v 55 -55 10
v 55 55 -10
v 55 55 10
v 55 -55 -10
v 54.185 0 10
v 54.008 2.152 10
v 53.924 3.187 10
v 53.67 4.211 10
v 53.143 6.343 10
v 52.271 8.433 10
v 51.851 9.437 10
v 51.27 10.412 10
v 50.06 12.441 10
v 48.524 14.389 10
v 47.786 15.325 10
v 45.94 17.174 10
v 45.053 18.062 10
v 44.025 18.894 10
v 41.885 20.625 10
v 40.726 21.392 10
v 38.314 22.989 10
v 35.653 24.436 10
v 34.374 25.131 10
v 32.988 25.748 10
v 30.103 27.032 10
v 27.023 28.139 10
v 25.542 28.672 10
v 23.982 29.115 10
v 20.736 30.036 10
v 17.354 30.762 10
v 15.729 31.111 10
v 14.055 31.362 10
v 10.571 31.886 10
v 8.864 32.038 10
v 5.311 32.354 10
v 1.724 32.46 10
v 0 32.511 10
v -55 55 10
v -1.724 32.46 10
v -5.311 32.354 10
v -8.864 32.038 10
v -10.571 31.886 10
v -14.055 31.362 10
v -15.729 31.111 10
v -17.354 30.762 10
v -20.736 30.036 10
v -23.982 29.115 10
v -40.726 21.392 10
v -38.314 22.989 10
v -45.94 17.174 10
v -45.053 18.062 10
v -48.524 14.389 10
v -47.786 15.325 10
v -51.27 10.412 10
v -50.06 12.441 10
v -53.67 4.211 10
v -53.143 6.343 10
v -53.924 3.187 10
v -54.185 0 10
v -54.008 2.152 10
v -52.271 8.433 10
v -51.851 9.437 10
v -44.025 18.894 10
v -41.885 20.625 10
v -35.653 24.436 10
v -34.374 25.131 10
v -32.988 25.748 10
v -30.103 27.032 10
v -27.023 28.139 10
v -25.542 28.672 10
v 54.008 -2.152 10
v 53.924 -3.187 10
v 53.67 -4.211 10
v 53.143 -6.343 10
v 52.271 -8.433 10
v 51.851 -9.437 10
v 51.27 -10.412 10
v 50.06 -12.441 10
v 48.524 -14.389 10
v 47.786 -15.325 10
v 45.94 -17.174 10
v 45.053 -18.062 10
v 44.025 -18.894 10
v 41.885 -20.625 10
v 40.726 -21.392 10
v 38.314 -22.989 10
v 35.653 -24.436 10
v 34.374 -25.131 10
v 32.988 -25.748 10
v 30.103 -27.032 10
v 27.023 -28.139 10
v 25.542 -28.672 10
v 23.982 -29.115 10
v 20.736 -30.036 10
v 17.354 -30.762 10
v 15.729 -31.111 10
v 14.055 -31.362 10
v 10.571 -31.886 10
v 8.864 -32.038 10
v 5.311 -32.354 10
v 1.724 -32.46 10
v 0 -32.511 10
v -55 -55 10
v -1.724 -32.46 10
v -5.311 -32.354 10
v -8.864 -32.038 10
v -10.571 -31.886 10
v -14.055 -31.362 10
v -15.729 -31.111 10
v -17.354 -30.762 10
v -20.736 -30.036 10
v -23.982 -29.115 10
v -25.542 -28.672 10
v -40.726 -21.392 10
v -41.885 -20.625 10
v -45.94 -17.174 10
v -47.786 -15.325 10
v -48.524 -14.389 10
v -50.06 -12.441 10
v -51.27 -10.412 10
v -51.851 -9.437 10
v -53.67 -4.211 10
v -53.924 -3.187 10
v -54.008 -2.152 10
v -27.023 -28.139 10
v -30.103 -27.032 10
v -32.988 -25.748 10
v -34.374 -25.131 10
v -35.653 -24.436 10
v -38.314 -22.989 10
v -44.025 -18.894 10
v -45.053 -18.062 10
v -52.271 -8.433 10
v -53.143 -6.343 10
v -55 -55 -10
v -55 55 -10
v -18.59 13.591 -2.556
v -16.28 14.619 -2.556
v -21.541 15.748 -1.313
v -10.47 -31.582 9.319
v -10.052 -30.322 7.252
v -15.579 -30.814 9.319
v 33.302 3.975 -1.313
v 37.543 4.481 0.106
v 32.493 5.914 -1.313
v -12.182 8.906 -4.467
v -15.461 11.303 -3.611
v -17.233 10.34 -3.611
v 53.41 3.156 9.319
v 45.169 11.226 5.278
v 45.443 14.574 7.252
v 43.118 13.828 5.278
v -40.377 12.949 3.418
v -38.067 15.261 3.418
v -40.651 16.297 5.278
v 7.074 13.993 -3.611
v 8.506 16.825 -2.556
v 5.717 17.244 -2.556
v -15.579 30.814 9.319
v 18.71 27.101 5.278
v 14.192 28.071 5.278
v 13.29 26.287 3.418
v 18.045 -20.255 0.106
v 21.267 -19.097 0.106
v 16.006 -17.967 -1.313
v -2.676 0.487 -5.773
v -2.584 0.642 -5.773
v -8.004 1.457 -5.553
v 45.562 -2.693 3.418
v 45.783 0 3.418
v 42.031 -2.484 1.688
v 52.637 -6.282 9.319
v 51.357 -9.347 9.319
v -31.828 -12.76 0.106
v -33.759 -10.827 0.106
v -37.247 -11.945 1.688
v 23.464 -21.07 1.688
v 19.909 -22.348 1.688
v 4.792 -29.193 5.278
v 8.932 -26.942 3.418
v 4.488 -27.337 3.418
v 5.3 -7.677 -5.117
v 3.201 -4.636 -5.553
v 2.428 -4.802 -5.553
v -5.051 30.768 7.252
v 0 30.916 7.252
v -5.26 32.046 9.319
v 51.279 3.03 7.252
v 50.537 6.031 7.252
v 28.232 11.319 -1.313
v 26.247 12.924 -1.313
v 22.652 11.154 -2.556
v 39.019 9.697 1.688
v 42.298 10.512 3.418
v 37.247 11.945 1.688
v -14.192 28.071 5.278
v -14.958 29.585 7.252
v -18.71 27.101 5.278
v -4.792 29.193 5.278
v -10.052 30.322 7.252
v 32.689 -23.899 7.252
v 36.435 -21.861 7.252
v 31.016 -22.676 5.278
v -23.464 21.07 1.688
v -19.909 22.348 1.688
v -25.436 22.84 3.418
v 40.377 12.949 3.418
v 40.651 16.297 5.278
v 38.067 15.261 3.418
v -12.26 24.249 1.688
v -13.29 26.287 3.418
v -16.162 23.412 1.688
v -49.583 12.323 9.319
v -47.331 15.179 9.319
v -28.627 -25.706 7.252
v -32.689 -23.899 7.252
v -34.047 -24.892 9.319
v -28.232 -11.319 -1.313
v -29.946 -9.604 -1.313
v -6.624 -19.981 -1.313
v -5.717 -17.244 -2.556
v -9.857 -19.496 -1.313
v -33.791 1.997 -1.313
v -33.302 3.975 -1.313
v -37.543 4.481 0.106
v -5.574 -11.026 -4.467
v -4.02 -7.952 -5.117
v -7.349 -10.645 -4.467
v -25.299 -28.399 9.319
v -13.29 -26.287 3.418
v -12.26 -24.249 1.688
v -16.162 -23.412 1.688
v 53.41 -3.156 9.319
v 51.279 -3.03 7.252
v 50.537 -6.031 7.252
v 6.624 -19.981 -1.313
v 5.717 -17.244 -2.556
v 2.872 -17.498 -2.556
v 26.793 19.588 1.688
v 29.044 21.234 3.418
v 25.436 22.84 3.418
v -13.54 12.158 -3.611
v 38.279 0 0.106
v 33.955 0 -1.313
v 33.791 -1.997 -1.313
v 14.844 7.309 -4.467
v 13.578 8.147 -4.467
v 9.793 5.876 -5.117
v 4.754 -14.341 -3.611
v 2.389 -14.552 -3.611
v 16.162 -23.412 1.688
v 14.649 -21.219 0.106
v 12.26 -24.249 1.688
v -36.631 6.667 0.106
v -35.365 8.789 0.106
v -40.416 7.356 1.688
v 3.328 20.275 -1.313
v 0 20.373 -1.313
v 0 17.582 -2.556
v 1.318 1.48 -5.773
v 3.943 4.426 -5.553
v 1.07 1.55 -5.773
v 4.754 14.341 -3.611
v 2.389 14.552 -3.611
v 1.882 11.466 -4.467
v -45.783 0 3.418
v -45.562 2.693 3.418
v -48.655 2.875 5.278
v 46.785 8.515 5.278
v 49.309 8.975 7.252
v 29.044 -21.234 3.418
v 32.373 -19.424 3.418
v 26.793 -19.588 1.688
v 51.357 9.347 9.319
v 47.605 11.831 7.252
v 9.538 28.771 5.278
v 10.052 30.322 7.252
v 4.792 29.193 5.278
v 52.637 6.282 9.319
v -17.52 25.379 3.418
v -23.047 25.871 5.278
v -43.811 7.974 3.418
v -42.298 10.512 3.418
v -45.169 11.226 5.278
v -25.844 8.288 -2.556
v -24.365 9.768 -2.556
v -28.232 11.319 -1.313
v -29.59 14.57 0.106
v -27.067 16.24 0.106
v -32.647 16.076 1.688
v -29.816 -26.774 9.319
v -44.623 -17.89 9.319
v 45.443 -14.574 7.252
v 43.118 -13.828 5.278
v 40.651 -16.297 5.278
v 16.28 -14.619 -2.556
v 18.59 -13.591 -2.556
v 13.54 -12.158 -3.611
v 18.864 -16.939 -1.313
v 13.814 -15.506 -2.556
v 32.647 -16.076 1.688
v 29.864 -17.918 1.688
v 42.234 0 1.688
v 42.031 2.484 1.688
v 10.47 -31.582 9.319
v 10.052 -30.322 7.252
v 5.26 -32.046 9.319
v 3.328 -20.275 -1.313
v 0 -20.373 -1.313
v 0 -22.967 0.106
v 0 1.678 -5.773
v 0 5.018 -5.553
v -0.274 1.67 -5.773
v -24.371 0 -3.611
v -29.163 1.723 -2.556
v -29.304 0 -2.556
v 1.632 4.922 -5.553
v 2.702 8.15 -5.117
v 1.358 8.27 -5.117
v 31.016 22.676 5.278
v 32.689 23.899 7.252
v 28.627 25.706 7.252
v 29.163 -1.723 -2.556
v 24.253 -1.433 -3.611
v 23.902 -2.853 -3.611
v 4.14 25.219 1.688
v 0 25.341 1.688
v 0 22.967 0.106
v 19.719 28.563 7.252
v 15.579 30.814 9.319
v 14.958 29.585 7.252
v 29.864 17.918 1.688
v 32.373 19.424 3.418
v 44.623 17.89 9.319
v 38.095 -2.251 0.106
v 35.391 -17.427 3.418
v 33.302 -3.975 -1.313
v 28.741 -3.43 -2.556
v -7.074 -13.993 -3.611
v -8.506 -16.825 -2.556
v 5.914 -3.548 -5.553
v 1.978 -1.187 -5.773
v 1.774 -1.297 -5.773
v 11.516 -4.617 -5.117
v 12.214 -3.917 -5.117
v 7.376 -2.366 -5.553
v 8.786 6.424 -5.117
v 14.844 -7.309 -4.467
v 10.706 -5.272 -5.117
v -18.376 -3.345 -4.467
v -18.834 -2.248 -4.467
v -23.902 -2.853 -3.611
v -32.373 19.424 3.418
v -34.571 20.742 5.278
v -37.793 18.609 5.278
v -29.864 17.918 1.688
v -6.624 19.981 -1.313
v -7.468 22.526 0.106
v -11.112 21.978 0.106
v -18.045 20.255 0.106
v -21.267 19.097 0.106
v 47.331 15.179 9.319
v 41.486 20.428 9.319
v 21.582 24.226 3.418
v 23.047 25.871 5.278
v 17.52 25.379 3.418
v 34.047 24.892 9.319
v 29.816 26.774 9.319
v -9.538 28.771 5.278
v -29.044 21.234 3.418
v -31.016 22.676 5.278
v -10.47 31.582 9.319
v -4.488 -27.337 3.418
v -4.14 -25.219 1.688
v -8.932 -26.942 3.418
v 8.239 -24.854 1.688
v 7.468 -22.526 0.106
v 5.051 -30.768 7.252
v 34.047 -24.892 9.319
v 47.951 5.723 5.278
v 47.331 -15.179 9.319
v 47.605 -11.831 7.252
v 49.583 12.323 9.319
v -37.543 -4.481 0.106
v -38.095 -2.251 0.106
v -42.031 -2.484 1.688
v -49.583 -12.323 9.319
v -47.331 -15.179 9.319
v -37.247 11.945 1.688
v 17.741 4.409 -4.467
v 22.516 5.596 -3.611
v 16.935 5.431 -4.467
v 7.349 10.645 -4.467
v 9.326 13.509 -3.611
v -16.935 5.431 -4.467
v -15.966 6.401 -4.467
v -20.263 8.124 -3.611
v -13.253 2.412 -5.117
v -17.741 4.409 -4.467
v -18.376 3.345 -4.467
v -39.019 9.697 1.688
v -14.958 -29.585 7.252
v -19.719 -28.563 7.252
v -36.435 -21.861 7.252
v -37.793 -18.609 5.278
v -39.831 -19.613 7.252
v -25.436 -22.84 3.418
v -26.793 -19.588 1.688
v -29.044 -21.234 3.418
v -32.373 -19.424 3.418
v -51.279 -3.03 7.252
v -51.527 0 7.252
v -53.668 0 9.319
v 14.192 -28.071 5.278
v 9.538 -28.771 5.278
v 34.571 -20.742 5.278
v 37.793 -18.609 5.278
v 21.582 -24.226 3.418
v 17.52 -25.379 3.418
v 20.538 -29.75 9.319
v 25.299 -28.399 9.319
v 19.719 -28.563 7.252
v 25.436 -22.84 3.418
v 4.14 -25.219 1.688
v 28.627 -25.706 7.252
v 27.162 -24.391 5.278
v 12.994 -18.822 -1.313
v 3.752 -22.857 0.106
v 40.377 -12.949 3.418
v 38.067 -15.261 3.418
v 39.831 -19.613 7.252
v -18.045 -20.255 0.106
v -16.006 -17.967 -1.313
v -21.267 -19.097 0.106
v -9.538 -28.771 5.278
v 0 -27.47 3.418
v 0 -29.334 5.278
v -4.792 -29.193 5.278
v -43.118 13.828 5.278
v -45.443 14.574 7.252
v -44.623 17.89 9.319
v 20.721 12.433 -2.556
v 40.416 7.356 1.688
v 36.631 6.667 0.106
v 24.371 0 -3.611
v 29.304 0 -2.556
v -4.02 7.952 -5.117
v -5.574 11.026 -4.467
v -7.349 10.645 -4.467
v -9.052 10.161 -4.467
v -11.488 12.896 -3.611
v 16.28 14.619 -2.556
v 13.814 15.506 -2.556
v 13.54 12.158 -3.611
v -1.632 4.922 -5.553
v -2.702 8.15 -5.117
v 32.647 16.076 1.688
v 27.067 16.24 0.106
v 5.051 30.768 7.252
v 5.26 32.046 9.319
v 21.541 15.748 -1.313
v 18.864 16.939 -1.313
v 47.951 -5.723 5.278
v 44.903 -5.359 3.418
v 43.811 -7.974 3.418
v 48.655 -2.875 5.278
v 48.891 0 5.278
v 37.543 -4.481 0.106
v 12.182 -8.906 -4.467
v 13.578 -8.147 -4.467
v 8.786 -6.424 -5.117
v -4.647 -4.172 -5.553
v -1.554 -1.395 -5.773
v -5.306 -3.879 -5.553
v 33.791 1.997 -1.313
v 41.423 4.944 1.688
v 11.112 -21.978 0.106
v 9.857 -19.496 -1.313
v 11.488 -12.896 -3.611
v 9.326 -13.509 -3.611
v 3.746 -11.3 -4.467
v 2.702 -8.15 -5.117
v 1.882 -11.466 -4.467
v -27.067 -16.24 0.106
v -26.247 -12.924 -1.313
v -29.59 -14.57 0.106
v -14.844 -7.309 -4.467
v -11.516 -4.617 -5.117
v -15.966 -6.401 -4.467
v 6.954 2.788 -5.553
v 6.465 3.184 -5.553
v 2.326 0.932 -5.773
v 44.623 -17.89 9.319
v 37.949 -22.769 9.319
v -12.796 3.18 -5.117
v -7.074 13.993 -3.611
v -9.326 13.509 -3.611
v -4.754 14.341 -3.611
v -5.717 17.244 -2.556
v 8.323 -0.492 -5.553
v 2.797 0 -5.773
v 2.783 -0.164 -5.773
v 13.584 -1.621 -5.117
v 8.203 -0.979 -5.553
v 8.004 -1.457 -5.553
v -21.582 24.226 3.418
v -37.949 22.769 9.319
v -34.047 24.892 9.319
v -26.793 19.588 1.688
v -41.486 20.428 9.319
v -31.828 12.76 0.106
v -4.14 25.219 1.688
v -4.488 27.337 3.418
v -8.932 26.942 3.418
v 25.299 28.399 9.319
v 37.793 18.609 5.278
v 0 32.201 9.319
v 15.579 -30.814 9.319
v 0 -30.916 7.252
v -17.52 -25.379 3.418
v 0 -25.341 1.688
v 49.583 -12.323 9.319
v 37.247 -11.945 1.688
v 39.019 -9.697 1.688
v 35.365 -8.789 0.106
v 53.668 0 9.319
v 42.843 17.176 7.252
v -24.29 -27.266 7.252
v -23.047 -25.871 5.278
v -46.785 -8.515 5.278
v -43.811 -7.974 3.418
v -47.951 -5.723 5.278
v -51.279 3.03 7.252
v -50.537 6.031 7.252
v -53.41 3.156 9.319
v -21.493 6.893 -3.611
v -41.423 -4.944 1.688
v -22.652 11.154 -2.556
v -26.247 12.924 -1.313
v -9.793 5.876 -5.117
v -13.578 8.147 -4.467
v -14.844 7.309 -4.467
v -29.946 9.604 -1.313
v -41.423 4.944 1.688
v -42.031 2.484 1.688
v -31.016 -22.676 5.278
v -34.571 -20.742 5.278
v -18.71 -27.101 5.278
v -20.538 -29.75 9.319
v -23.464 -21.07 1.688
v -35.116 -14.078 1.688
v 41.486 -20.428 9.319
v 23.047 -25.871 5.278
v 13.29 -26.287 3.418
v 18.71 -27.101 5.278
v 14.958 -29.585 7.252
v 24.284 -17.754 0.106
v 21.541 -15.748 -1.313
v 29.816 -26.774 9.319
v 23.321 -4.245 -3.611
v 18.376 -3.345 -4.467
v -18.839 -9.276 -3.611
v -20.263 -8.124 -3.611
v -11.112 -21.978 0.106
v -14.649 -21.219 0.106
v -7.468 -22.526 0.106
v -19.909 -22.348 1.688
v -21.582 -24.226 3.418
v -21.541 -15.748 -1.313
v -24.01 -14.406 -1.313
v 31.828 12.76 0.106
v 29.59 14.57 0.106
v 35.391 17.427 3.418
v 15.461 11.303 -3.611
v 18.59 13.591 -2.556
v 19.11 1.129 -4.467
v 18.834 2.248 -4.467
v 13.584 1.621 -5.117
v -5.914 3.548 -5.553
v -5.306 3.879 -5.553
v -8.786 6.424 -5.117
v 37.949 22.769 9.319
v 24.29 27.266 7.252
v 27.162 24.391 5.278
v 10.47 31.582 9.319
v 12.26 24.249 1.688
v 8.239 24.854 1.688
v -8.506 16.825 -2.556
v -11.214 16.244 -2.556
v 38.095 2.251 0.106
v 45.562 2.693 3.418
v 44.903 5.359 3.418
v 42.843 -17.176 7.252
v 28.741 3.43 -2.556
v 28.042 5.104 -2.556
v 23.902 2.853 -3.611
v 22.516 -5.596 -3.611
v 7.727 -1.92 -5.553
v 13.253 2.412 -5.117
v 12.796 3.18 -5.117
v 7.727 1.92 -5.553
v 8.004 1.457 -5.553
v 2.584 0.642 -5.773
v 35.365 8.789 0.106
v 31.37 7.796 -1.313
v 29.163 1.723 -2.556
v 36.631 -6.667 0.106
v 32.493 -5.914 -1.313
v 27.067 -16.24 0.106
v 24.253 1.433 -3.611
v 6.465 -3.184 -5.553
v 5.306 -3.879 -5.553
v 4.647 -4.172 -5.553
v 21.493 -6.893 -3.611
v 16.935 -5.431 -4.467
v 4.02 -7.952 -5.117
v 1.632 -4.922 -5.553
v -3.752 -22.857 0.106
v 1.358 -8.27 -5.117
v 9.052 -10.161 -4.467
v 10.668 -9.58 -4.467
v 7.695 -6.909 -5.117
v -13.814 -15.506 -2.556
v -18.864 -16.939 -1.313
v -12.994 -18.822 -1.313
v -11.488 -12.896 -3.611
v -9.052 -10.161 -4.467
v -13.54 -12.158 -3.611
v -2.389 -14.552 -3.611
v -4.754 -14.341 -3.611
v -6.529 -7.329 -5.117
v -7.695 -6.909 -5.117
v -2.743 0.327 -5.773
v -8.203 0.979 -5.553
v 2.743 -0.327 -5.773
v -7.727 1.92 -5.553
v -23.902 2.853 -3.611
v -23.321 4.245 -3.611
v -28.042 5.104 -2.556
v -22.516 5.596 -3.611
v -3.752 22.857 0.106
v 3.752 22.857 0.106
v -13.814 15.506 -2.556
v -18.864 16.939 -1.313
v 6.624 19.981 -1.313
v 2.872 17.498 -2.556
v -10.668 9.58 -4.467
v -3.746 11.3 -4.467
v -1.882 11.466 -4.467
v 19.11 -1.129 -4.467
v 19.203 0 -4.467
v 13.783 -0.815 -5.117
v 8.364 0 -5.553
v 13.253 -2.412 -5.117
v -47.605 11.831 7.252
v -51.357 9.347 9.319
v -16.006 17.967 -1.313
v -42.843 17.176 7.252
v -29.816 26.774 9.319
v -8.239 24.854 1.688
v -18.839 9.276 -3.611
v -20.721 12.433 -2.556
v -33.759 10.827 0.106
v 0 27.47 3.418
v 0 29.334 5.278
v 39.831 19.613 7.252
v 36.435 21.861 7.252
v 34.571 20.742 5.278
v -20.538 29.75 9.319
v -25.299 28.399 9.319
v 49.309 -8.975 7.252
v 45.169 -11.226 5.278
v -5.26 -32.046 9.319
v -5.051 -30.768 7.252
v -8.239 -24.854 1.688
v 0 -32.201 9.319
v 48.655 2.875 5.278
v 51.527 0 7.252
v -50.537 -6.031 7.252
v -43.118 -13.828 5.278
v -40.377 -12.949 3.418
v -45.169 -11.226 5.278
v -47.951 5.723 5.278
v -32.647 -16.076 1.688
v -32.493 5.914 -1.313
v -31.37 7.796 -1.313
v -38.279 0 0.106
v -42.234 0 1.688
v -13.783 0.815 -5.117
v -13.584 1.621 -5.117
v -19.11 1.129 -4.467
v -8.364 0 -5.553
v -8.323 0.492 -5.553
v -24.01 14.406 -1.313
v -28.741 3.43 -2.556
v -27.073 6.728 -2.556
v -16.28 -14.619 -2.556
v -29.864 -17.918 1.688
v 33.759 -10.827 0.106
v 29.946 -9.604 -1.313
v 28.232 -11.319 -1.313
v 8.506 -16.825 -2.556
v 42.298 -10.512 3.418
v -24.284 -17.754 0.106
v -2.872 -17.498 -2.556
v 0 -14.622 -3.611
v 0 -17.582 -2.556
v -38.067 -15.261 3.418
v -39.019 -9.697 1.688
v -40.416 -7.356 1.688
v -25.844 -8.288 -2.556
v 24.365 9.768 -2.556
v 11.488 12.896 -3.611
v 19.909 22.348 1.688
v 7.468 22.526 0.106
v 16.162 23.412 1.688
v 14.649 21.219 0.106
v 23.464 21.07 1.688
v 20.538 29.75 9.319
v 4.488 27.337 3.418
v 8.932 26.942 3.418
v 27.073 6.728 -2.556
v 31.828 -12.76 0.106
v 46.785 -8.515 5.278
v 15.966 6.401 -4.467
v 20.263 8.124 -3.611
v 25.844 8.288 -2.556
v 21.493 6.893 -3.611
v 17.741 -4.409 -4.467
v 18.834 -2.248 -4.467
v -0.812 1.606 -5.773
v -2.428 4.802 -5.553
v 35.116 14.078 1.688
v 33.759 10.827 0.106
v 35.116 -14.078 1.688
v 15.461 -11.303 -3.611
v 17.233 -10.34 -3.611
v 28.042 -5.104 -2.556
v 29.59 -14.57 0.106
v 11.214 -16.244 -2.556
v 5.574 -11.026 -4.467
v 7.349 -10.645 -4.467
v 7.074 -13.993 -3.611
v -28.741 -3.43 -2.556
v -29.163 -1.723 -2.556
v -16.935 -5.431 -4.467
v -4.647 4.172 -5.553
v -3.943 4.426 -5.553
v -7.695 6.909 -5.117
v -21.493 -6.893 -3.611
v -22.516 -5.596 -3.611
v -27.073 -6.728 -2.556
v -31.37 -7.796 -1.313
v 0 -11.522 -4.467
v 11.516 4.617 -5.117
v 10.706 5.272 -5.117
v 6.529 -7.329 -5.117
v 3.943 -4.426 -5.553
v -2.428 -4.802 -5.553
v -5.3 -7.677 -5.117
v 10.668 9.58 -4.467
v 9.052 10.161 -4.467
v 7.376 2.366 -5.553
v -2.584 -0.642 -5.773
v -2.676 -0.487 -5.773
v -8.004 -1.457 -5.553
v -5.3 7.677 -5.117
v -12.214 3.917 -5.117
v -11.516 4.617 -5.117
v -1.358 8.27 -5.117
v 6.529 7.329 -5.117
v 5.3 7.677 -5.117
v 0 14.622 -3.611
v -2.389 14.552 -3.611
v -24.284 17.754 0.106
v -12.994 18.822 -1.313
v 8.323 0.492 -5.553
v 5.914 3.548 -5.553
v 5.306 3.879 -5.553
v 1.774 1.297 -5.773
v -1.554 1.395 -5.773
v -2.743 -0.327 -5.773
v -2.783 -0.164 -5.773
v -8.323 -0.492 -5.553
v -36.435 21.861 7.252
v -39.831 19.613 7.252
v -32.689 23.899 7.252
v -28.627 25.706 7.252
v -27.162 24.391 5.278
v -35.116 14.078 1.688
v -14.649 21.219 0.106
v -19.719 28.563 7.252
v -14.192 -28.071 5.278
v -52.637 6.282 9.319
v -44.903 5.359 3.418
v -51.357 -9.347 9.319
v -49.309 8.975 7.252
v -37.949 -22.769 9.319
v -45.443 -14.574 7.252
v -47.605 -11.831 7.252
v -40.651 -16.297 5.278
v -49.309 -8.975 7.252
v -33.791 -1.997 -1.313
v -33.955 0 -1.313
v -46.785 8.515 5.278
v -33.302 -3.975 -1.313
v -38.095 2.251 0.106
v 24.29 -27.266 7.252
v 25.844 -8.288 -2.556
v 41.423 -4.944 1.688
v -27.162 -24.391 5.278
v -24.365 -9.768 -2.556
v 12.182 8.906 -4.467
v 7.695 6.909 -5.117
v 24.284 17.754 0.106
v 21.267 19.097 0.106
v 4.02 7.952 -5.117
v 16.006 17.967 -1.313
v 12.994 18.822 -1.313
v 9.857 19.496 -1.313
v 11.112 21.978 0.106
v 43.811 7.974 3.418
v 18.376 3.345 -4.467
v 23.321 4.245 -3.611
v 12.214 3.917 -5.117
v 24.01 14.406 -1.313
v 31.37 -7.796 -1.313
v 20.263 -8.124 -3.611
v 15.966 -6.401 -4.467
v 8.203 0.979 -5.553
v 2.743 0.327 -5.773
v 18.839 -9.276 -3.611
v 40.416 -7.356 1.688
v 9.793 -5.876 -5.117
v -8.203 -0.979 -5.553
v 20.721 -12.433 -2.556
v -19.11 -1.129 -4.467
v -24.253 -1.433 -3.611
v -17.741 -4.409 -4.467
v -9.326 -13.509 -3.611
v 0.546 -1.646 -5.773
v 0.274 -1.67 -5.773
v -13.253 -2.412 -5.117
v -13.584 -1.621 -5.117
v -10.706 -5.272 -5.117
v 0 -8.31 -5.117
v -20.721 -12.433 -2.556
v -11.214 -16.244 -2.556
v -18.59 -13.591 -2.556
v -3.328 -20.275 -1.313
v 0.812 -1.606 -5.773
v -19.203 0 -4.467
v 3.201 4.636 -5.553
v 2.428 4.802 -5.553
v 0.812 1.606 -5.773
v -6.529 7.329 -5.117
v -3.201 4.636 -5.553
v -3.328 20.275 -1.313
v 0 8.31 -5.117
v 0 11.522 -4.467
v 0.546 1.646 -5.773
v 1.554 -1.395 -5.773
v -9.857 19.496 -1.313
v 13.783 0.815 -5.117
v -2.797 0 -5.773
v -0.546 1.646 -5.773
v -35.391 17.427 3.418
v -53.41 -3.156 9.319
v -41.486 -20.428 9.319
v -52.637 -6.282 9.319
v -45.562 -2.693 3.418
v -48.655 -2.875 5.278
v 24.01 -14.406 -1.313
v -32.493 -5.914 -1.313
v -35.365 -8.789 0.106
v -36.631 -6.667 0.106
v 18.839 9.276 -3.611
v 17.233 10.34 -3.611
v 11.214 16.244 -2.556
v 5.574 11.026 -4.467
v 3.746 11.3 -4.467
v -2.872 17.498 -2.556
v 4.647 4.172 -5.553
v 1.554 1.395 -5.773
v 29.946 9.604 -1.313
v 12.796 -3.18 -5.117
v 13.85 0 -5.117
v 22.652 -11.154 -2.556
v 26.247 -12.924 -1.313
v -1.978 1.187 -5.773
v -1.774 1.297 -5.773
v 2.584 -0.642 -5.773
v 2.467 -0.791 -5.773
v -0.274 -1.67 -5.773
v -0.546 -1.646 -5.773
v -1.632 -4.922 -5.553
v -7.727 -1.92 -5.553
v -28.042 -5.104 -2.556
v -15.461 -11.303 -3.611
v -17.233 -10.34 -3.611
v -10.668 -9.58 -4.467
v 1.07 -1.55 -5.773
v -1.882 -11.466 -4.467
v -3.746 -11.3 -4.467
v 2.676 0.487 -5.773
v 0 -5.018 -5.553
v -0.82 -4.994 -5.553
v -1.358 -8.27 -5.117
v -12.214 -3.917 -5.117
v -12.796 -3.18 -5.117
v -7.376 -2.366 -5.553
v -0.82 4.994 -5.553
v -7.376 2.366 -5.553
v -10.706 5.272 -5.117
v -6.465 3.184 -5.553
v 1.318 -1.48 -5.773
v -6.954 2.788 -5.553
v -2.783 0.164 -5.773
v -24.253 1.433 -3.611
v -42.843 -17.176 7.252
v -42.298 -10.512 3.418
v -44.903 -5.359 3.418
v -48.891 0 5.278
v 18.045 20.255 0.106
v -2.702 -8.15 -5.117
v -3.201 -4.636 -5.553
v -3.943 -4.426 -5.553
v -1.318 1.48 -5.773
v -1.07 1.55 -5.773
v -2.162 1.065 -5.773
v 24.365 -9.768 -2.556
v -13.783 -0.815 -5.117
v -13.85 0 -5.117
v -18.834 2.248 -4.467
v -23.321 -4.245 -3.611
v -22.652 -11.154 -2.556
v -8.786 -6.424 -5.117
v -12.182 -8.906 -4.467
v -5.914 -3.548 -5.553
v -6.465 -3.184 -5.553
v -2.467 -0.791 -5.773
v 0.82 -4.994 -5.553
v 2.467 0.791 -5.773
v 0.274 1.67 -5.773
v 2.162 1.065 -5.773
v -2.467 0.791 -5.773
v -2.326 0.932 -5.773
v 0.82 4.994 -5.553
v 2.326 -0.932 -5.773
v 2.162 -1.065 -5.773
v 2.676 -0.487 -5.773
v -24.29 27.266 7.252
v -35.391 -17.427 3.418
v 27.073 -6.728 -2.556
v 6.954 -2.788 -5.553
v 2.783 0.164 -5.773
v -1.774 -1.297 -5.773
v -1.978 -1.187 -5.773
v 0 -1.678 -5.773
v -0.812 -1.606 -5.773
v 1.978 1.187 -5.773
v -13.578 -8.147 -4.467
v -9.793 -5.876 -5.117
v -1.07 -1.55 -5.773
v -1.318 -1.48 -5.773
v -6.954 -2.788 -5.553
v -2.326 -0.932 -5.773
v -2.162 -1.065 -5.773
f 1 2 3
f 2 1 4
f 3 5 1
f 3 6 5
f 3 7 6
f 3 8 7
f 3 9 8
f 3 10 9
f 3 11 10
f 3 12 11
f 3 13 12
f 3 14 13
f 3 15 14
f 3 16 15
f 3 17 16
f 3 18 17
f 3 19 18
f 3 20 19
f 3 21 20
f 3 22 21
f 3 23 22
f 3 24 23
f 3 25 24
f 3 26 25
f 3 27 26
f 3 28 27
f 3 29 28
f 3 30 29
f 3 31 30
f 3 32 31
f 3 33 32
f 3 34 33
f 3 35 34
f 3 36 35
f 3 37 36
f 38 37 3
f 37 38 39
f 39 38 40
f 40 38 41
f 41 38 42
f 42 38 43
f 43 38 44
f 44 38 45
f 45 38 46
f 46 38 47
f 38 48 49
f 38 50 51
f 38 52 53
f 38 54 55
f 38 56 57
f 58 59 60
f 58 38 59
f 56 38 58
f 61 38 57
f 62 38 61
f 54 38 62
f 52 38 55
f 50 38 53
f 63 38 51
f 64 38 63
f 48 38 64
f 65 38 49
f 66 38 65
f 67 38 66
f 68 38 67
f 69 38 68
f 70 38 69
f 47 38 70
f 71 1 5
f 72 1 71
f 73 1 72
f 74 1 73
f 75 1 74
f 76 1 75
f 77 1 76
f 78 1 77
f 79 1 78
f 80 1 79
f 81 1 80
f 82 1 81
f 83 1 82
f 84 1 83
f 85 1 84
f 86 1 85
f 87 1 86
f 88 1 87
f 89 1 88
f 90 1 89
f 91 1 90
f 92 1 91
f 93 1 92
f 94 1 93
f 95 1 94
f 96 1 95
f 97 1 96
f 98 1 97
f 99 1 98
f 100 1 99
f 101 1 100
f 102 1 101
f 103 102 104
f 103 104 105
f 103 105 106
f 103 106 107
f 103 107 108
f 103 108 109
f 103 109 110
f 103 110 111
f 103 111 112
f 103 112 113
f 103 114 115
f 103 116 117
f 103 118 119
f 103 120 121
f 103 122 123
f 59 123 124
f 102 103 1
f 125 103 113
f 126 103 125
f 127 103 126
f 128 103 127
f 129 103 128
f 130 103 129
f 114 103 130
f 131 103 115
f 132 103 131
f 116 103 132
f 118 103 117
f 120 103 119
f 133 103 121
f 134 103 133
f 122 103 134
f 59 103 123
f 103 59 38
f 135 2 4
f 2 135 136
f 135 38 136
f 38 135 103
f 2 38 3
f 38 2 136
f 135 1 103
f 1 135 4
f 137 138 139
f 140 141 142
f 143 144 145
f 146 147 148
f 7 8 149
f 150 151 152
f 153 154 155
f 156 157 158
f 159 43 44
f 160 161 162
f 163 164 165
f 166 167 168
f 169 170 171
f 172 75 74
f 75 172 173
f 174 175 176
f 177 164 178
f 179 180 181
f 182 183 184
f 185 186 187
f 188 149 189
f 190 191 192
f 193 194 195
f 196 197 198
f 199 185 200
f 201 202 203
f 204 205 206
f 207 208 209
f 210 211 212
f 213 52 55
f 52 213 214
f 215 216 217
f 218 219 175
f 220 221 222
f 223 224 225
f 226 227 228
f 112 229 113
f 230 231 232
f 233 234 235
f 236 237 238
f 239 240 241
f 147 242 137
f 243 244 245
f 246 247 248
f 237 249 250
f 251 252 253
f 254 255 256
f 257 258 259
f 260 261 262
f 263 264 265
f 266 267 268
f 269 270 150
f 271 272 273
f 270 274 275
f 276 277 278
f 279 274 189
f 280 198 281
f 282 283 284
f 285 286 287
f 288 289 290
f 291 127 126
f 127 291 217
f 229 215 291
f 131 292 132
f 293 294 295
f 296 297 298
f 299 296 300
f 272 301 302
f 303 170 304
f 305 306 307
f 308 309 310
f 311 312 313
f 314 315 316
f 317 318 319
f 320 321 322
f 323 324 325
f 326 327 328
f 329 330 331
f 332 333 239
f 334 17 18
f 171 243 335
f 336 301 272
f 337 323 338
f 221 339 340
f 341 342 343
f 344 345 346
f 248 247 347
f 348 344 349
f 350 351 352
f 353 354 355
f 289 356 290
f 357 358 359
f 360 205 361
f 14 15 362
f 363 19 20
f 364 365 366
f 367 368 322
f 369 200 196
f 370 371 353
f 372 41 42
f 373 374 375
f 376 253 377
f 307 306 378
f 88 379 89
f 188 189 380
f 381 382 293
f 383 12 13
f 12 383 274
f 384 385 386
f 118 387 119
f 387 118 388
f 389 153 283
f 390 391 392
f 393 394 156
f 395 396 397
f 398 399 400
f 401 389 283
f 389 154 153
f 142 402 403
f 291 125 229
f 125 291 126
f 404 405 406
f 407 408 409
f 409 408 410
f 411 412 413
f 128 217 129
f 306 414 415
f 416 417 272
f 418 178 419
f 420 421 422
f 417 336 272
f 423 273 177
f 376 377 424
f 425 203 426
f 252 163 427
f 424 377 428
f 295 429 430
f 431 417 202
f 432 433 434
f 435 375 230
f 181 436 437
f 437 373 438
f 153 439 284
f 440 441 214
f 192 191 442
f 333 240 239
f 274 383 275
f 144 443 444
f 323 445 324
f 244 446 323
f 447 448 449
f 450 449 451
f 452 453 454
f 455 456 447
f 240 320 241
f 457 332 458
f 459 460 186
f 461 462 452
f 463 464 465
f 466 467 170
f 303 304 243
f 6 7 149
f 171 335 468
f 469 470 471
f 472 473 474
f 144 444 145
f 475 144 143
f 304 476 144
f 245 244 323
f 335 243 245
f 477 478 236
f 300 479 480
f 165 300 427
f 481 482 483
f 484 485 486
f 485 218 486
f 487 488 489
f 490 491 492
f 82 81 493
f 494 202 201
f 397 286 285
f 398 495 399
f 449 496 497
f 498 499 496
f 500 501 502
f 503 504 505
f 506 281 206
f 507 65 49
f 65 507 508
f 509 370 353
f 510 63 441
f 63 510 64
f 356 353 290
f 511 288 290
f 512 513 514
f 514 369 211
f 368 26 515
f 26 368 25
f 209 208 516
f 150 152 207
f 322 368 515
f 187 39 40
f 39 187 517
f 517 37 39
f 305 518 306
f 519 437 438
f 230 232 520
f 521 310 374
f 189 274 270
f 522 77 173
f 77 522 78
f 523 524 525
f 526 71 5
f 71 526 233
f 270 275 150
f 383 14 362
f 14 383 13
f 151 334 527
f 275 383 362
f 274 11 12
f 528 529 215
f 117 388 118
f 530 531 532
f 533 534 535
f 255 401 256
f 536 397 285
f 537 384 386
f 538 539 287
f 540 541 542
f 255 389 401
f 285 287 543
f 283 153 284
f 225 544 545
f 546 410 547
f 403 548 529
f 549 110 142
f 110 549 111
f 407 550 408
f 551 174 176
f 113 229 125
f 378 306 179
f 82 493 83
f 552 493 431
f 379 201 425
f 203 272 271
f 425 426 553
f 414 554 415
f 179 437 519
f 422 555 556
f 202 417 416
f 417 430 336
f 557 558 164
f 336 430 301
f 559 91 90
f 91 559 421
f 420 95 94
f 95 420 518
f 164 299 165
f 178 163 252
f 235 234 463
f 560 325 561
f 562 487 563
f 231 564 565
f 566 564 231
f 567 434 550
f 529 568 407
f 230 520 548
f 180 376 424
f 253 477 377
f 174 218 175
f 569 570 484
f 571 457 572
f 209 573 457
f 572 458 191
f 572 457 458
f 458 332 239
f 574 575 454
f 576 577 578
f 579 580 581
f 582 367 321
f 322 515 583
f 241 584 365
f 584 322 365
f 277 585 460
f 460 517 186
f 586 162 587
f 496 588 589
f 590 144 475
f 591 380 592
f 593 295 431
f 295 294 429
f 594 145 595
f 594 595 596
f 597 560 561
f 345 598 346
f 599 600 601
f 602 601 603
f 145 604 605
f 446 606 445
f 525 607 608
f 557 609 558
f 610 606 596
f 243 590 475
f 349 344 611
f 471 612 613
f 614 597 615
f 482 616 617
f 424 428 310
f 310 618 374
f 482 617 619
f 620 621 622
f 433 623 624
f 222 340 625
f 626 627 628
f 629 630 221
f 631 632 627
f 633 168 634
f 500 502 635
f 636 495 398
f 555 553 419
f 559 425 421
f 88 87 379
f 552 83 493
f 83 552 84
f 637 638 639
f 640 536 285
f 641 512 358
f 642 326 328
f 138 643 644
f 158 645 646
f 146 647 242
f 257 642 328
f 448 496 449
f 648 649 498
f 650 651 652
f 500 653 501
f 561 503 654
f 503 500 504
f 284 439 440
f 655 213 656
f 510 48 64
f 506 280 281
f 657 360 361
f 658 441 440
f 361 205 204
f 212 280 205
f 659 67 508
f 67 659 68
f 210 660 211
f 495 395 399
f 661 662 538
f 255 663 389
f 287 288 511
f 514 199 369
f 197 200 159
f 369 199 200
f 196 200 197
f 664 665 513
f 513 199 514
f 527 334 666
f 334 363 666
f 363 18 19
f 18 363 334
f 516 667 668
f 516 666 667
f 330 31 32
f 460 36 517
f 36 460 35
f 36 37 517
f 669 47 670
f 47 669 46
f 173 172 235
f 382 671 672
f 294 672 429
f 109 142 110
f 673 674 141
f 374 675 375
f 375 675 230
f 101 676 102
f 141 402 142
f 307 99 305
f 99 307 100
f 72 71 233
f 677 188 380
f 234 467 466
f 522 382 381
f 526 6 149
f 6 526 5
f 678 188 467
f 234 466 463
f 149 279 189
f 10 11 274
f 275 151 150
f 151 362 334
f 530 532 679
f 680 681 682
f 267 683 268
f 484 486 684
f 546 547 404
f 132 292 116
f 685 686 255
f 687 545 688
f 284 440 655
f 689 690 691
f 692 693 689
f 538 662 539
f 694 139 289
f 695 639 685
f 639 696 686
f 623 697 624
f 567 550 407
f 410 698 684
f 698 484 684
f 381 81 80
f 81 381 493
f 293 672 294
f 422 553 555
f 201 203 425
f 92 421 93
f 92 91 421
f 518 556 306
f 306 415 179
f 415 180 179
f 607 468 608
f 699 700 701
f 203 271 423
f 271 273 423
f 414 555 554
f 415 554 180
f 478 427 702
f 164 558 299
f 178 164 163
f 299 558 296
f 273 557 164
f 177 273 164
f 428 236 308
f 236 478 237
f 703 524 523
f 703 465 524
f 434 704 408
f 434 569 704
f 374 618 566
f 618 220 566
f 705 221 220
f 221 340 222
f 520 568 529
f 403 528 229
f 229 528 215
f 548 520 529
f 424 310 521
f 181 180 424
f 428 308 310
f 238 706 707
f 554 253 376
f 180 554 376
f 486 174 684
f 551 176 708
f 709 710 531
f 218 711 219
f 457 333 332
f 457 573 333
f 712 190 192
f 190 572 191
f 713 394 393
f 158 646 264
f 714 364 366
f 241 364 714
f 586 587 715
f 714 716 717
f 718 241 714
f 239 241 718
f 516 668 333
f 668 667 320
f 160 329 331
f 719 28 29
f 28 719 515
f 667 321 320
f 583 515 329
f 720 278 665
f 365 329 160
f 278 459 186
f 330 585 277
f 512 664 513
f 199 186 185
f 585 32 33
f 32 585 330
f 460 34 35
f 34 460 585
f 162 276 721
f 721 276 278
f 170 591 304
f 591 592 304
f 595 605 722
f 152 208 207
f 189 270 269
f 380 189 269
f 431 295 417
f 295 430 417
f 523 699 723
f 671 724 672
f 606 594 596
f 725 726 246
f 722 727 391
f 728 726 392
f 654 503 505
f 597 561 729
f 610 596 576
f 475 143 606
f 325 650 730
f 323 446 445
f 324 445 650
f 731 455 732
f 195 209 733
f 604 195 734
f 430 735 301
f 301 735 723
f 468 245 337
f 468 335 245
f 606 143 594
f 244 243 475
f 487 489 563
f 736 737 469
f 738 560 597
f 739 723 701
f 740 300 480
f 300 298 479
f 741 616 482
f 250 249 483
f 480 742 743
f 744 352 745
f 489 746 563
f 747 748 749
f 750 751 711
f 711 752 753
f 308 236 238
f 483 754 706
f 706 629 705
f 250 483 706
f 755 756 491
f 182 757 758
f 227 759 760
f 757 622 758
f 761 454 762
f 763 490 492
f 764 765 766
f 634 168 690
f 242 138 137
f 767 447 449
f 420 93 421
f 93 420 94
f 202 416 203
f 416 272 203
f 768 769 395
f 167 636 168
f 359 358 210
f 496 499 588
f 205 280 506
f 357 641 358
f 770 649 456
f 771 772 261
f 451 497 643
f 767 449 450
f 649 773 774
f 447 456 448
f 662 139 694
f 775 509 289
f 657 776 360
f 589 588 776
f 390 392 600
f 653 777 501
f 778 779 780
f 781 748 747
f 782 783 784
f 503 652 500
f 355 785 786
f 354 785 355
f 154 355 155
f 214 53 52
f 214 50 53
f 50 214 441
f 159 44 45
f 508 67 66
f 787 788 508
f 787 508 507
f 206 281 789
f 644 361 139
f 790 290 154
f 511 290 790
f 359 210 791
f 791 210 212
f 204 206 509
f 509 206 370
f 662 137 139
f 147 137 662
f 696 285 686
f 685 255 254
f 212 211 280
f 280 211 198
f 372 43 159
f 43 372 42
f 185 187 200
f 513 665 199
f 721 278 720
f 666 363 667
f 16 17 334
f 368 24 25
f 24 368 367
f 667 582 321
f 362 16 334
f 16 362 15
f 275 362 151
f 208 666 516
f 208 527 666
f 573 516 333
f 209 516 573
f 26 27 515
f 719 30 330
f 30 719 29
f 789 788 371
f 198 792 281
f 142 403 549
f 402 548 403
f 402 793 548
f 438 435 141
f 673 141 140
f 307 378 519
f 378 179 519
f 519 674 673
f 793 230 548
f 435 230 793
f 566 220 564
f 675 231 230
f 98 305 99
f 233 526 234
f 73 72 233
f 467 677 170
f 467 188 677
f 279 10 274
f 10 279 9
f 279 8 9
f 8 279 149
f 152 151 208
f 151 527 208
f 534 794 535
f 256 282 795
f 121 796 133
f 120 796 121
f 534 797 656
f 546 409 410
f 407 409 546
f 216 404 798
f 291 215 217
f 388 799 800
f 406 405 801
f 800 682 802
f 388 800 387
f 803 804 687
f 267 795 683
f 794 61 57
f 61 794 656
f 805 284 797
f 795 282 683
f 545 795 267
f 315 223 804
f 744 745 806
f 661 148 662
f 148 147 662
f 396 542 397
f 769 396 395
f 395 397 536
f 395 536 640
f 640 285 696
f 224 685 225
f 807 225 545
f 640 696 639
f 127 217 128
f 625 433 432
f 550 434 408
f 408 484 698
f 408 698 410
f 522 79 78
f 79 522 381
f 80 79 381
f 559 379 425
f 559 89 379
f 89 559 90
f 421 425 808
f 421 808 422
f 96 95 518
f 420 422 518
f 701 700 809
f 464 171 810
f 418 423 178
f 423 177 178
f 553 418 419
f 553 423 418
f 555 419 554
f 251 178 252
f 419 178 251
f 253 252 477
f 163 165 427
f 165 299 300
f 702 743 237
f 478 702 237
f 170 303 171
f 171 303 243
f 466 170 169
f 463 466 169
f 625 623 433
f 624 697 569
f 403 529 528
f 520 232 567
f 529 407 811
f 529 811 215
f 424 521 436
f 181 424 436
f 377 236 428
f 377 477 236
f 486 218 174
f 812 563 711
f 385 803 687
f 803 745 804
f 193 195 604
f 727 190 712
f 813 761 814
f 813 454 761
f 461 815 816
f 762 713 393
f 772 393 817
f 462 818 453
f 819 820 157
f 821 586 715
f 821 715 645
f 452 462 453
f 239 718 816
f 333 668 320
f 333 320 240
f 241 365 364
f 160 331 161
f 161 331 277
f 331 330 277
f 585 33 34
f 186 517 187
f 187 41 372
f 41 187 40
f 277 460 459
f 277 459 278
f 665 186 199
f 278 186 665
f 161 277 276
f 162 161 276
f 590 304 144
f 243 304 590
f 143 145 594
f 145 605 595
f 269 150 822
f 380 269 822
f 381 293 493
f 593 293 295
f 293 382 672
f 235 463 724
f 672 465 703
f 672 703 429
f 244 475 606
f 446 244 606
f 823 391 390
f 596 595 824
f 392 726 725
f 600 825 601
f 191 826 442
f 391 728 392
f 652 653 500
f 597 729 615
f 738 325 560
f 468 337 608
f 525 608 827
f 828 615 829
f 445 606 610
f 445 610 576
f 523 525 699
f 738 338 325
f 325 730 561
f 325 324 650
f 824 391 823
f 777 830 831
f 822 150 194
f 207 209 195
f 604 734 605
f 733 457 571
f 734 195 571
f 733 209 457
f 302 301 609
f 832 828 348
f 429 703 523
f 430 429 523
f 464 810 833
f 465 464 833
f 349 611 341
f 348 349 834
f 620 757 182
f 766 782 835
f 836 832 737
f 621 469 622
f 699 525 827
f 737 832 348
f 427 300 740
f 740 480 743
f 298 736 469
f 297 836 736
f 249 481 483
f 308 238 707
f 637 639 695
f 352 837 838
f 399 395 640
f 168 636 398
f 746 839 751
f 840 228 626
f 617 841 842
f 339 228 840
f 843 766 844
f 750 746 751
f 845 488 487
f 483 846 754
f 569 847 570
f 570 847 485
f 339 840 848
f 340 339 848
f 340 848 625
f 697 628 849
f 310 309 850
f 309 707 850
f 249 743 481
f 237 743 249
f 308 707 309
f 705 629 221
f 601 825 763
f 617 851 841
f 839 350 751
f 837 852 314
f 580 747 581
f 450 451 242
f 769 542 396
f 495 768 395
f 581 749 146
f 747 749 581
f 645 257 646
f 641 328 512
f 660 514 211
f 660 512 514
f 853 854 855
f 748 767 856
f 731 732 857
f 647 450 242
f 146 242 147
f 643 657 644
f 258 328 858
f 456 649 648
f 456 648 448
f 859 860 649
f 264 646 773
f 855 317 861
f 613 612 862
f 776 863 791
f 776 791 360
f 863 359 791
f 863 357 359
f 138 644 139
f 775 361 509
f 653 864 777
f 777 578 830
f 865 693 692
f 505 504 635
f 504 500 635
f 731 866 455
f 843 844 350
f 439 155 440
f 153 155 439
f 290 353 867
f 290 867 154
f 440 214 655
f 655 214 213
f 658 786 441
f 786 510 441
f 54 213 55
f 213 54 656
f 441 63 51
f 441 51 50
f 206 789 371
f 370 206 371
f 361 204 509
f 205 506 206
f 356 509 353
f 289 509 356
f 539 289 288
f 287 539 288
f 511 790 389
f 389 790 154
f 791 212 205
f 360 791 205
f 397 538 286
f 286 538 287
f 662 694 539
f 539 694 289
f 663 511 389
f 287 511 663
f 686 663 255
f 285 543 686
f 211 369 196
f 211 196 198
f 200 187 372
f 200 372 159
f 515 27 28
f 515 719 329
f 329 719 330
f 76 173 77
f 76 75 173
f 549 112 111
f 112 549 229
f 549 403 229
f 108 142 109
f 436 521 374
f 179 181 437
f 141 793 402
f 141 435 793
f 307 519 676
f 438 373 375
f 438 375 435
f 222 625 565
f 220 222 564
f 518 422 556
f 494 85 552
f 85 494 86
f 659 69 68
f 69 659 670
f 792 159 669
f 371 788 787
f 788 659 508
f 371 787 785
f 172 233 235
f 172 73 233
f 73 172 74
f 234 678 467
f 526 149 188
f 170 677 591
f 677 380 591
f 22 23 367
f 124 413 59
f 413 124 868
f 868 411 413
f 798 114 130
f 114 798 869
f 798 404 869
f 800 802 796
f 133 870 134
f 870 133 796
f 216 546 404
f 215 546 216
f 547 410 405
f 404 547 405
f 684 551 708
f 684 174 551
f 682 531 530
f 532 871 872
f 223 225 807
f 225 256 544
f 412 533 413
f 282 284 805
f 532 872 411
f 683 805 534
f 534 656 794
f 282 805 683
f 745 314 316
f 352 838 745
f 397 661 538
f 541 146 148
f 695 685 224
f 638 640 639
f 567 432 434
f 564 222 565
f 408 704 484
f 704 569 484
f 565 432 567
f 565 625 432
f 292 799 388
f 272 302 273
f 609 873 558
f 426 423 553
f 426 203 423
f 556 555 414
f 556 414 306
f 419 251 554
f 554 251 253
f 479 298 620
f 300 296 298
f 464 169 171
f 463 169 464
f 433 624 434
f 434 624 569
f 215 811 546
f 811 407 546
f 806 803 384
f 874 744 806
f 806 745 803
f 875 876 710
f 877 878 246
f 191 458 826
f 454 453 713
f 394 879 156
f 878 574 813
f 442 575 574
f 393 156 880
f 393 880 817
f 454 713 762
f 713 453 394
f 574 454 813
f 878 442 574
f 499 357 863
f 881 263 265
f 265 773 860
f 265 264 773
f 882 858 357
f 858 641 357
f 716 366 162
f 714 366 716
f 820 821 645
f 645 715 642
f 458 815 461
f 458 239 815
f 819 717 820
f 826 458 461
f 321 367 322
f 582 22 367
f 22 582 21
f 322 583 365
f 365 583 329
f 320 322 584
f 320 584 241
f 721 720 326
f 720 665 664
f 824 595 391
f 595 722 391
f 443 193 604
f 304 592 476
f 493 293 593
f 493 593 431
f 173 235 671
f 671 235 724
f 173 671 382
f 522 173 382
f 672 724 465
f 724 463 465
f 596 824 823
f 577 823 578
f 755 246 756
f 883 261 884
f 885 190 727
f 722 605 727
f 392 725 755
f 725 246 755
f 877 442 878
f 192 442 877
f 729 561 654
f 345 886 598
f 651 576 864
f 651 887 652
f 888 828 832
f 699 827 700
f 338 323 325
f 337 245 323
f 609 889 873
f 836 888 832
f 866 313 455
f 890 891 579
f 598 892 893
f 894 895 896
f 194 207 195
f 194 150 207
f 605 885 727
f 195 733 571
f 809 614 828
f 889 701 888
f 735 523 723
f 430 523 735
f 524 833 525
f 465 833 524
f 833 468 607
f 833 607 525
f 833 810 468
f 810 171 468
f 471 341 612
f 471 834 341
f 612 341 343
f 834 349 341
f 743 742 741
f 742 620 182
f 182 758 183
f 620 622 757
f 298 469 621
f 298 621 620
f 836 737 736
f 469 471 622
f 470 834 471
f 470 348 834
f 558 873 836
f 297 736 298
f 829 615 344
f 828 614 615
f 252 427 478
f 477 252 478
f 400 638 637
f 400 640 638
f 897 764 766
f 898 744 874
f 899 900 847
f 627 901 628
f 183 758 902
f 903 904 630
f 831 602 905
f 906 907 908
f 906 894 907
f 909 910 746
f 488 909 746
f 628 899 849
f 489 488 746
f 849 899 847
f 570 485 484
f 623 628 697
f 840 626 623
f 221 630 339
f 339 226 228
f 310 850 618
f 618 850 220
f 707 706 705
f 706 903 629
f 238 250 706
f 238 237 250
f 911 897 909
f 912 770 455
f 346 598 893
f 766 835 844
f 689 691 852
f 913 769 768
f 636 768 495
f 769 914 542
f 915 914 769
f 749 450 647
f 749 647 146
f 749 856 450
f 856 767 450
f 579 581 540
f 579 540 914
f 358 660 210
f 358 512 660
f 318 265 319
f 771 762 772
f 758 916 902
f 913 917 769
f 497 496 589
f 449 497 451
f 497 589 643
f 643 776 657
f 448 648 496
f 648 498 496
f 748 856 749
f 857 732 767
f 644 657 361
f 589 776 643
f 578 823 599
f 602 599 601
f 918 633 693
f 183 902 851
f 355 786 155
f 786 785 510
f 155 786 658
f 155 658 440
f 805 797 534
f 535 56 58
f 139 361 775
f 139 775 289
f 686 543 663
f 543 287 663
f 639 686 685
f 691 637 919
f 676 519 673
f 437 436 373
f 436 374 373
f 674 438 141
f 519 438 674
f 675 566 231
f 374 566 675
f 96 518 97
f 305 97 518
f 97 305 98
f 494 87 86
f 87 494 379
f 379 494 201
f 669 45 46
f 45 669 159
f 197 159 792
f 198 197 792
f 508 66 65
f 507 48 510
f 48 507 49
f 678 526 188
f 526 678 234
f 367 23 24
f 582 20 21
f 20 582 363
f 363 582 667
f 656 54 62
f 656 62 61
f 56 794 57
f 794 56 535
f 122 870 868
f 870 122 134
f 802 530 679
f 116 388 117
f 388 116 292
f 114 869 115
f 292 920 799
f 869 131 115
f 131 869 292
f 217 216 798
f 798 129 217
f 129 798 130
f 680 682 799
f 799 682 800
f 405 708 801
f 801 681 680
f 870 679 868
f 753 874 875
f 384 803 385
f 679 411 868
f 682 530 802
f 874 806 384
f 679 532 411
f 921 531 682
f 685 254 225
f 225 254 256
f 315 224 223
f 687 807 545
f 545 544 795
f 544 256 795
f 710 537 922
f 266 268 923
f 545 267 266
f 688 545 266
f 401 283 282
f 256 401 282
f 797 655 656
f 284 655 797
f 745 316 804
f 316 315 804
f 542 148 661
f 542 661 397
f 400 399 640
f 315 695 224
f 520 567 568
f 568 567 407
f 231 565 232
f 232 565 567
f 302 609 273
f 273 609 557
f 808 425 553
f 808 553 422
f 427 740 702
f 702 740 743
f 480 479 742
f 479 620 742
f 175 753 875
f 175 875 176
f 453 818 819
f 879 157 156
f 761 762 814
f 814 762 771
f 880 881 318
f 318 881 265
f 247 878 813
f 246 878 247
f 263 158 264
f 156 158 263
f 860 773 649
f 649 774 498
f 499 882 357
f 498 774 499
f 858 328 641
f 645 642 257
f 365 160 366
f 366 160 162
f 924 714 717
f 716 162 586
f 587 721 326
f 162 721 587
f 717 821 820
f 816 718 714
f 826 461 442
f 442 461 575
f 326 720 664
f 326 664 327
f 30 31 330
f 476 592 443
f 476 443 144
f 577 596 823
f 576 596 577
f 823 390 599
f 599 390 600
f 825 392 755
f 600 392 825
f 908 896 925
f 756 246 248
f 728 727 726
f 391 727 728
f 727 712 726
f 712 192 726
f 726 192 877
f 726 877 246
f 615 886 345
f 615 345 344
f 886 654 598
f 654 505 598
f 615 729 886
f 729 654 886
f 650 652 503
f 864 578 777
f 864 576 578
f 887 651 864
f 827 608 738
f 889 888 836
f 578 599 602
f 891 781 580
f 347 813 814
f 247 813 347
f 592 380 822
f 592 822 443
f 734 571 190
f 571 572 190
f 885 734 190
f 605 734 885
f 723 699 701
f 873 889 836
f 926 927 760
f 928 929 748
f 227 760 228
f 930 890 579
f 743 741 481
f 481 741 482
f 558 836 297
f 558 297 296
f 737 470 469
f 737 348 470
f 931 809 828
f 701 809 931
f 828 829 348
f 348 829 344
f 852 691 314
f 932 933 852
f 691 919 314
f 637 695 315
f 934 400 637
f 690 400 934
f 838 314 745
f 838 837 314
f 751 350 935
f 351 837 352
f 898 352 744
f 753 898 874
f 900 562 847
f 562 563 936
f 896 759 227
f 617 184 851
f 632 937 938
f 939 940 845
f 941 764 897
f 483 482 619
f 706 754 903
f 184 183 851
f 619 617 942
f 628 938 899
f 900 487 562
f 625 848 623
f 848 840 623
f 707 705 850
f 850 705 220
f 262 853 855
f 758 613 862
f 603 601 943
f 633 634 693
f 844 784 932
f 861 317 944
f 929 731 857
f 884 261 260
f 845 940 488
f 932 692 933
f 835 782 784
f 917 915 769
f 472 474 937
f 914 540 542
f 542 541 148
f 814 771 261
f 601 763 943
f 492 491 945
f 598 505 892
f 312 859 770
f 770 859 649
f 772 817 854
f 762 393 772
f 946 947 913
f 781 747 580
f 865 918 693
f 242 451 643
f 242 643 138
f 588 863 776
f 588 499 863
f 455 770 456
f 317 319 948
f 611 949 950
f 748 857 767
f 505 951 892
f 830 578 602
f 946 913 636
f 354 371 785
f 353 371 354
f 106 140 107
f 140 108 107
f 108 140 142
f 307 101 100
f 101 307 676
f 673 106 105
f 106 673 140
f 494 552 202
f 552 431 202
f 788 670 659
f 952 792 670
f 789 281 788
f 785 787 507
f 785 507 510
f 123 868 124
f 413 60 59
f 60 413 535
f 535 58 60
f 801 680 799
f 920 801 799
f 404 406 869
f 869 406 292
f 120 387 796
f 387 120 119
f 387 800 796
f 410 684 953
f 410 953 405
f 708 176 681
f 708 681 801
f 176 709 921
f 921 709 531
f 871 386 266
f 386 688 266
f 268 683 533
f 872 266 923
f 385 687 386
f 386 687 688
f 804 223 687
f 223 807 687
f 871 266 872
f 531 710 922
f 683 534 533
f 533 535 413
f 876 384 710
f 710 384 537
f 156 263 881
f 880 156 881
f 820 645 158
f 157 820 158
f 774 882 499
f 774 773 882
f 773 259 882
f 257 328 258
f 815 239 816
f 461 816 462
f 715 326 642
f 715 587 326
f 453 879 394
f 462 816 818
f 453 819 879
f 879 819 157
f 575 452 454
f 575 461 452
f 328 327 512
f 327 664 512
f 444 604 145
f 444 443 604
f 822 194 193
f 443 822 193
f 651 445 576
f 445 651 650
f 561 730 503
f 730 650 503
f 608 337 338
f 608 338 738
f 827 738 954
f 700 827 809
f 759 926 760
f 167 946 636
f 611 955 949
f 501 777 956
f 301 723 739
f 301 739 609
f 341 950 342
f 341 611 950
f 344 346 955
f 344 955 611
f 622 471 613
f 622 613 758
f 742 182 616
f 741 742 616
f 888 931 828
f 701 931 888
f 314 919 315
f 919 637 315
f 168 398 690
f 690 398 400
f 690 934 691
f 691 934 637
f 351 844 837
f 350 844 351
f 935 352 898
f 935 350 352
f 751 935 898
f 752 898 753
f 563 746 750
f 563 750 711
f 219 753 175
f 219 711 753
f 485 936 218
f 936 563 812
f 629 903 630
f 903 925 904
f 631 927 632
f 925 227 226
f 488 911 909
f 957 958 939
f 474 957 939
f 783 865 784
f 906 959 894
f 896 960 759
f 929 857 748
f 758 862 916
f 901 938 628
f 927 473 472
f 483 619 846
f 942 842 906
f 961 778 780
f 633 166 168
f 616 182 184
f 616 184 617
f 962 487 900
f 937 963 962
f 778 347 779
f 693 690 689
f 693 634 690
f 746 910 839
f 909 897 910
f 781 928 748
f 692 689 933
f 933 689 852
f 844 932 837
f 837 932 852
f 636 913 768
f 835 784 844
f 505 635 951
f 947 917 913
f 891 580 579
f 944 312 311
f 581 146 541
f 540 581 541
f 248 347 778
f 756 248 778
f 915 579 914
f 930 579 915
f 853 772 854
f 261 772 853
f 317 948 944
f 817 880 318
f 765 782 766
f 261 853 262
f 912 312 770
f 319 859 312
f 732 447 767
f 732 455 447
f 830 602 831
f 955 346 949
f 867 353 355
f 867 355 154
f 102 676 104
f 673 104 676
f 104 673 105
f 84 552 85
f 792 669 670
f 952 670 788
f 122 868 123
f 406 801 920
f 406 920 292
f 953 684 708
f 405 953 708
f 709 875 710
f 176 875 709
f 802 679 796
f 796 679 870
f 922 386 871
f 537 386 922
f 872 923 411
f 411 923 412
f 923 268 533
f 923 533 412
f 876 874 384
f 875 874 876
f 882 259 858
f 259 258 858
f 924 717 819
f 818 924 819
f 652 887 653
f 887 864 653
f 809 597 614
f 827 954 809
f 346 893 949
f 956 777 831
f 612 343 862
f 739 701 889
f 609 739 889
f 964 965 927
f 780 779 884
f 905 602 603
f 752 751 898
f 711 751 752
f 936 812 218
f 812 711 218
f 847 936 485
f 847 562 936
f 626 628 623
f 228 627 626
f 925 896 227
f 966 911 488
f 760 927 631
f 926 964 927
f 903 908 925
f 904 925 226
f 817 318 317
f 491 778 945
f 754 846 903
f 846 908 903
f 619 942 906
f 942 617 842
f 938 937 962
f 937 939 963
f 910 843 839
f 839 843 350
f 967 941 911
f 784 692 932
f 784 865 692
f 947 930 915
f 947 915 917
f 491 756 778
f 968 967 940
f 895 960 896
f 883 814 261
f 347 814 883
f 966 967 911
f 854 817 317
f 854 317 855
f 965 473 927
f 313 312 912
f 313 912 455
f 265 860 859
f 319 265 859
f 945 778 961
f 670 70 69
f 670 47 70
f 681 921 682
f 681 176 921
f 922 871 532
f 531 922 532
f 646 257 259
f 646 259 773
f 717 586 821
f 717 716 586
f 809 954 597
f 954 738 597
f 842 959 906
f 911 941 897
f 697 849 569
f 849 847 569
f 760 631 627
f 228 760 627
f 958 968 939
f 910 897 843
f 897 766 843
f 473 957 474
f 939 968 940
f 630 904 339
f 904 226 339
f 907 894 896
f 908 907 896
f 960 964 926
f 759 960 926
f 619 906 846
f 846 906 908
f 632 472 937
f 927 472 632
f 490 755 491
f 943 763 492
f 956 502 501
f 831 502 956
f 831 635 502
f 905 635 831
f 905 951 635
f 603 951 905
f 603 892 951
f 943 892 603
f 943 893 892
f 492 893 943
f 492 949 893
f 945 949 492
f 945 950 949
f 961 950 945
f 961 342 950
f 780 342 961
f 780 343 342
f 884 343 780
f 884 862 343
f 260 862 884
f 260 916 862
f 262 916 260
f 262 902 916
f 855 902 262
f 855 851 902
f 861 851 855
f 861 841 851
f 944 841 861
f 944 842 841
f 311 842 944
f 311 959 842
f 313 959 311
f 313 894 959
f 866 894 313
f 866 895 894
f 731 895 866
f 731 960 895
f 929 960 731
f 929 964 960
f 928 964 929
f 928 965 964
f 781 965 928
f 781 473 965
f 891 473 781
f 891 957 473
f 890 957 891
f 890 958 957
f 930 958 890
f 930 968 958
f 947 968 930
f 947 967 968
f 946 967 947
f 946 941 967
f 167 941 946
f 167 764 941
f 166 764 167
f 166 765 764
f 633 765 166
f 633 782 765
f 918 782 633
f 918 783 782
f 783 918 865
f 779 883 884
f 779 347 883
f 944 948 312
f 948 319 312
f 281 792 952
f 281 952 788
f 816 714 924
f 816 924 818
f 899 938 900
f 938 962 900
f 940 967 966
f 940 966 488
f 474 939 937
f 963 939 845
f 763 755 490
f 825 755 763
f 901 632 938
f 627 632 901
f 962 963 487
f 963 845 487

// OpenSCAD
// Semi-circular "bowl"

//Flattened sphere
module bowl() {
  scale([1, .6, .4])
    sphere(r=57, $fn=64);
  }

// "tool" shaped like inverse of the cutout
module cutter() {
  difference() {
    bowl();
    }
  }

// piece of wood we want to cut into
module stock() {
  cube([110,110,20], true);
  }

// Subtract the cutter from stock
difference() {
  stock();
  translate([0,0,17]) cutter();
  }
